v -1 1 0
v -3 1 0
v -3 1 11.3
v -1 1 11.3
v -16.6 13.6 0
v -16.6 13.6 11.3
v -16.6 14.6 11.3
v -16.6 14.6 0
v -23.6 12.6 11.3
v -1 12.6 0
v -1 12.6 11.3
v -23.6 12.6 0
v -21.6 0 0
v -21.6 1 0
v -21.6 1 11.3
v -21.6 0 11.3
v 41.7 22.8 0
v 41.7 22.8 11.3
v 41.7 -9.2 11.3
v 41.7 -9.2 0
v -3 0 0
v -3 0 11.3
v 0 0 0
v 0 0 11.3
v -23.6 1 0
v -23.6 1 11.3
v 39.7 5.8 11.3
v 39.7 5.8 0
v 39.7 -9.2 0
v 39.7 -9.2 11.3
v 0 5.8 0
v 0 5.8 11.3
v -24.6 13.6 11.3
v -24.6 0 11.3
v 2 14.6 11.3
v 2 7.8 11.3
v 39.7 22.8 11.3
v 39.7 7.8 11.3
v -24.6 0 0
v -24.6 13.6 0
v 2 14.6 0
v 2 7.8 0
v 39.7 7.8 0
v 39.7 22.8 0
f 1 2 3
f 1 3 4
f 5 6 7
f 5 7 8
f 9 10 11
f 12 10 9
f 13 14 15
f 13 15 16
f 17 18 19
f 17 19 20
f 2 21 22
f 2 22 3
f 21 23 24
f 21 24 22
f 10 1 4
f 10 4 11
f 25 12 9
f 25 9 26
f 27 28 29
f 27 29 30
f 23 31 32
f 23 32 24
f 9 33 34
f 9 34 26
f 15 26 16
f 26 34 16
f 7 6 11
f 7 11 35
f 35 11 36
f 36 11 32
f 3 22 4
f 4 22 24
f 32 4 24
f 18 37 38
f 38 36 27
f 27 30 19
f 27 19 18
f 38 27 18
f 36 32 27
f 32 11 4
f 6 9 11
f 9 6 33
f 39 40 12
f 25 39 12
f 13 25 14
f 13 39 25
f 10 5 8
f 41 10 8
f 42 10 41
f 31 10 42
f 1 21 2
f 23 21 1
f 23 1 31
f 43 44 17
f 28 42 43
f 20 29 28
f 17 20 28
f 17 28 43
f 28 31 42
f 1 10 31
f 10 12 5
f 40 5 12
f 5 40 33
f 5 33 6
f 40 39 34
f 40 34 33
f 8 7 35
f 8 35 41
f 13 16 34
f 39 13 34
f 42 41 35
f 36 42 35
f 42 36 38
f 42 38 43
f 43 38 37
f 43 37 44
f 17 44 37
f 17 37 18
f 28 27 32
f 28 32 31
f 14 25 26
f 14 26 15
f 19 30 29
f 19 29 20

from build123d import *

# Parameters (mm, degrees)
BOSS_EXTRU_1_DEPTH = 11.3
ESQUISSE2_W        = 8.6
ESQUISSE2_H        = 11.3
BOSS_EXTRU_2_DEPTH = 1
ESQUISSE8_W        = 11.3
ESQUISSE8_H        = 1
BOSS_EXTRU_5_DEPTH = 10
ESQUISSE9_W        = 2
ESQUISSE9_H        = 11.3
BOSS_EXTRU_6_DEPTH = 7.8
ESQUISSE10_W       = 11.3
ESQUISSE10_H       = 2
BOSS_EXTRU_7_DEPTH = 39.7
ESQUISSE11_W       = 2
ESQUISSE11_H       = 11.3
BOSS_EXTRU_8_DEPTH = 15
ESQUISSE12_W       = 2
ESQUISSE12_H       = 11.3
BOSS_EXTRU_9_DEPTH = 15


with BuildPart() as part:
    # Esquisse1 → Boss.-Extru.1 (new body)
    with BuildSketch(Plane.XY):
        Polygon((-21.6, 1), (-21.6, 0), (-24.6, 0), (-24.6, 13.6), (0, 13.6), (0, 0), (-3, 0), (-3, 1), (-1, 1), (-1, 12.6), (-23.6, 12.6), (-23.6, 1), align=None)
    extrude(amount=BOSS_EXTRU_1_DEPTH)

    # Esquisse2 → Boss.-Extru.2 (add)
    with BuildSketch(Plane(origin=(0, 13.6, 0), x_dir=(1, 0, 0), z_dir=(0, 1, 0))):
        with Locations((-12.3, -5.65)):
            Rectangle(ESQUISSE2_W, ESQUISSE2_H)
    extrude(amount=BOSS_EXTRU_2_DEPTH)

    # Esquisse8 → Boss.-Extru.5 (add)
    with BuildSketch(Plane(origin=(-8, 0, 0), x_dir=(0, 0, -1), z_dir=(1, 0, 0))):
        with Locations((-5.65, 14.1)):
            Rectangle(ESQUISSE8_W, ESQUISSE8_H)
    extrude(amount=BOSS_EXTRU_5_DEPTH)

    # Esquisse9 → Boss.-Extru.6 (add)
    with BuildSketch(Plane.XZ.offset(-13.6)):
        with Locations((1, 5.65)):
            Rectangle(ESQUISSE9_W, ESQUISSE9_H)
    extrude(amount=BOSS_EXTRU_6_DEPTH)

    # Esquisse10 → Boss.-Extru.7 (add)
    with BuildSketch(Plane(origin=(2, 0, 0), x_dir=(0, 0, -1), z_dir=(1, 0, 0))):
        with Locations((-5.65, 6.8)):
            Rectangle(ESQUISSE10_W, ESQUISSE10_H)
    extrude(amount=BOSS_EXTRU_7_DEPTH)

    # Esquisse11 → Boss.-Extru.8 (add)
    with BuildSketch(Plane.XZ.offset(-5.8)):
        with Locations((40.7, 5.65)):
            Rectangle(ESQUISSE11_W, ESQUISSE11_H)
    extrude(amount=BOSS_EXTRU_8_DEPTH)

    # Esquisse12 → Boss.-Extru.9 (add)
    with BuildSketch(Plane(origin=(0, 7.8, 0), x_dir=(1, 0, 0), z_dir=(0, 1, 0))):
        with Locations((40.7, -5.65)):
            Rectangle(ESQUISSE12_W, ESQUISSE12_H)
    extrude(amount=BOSS_EXTRU_9_DEPTH)


solid = part.part
